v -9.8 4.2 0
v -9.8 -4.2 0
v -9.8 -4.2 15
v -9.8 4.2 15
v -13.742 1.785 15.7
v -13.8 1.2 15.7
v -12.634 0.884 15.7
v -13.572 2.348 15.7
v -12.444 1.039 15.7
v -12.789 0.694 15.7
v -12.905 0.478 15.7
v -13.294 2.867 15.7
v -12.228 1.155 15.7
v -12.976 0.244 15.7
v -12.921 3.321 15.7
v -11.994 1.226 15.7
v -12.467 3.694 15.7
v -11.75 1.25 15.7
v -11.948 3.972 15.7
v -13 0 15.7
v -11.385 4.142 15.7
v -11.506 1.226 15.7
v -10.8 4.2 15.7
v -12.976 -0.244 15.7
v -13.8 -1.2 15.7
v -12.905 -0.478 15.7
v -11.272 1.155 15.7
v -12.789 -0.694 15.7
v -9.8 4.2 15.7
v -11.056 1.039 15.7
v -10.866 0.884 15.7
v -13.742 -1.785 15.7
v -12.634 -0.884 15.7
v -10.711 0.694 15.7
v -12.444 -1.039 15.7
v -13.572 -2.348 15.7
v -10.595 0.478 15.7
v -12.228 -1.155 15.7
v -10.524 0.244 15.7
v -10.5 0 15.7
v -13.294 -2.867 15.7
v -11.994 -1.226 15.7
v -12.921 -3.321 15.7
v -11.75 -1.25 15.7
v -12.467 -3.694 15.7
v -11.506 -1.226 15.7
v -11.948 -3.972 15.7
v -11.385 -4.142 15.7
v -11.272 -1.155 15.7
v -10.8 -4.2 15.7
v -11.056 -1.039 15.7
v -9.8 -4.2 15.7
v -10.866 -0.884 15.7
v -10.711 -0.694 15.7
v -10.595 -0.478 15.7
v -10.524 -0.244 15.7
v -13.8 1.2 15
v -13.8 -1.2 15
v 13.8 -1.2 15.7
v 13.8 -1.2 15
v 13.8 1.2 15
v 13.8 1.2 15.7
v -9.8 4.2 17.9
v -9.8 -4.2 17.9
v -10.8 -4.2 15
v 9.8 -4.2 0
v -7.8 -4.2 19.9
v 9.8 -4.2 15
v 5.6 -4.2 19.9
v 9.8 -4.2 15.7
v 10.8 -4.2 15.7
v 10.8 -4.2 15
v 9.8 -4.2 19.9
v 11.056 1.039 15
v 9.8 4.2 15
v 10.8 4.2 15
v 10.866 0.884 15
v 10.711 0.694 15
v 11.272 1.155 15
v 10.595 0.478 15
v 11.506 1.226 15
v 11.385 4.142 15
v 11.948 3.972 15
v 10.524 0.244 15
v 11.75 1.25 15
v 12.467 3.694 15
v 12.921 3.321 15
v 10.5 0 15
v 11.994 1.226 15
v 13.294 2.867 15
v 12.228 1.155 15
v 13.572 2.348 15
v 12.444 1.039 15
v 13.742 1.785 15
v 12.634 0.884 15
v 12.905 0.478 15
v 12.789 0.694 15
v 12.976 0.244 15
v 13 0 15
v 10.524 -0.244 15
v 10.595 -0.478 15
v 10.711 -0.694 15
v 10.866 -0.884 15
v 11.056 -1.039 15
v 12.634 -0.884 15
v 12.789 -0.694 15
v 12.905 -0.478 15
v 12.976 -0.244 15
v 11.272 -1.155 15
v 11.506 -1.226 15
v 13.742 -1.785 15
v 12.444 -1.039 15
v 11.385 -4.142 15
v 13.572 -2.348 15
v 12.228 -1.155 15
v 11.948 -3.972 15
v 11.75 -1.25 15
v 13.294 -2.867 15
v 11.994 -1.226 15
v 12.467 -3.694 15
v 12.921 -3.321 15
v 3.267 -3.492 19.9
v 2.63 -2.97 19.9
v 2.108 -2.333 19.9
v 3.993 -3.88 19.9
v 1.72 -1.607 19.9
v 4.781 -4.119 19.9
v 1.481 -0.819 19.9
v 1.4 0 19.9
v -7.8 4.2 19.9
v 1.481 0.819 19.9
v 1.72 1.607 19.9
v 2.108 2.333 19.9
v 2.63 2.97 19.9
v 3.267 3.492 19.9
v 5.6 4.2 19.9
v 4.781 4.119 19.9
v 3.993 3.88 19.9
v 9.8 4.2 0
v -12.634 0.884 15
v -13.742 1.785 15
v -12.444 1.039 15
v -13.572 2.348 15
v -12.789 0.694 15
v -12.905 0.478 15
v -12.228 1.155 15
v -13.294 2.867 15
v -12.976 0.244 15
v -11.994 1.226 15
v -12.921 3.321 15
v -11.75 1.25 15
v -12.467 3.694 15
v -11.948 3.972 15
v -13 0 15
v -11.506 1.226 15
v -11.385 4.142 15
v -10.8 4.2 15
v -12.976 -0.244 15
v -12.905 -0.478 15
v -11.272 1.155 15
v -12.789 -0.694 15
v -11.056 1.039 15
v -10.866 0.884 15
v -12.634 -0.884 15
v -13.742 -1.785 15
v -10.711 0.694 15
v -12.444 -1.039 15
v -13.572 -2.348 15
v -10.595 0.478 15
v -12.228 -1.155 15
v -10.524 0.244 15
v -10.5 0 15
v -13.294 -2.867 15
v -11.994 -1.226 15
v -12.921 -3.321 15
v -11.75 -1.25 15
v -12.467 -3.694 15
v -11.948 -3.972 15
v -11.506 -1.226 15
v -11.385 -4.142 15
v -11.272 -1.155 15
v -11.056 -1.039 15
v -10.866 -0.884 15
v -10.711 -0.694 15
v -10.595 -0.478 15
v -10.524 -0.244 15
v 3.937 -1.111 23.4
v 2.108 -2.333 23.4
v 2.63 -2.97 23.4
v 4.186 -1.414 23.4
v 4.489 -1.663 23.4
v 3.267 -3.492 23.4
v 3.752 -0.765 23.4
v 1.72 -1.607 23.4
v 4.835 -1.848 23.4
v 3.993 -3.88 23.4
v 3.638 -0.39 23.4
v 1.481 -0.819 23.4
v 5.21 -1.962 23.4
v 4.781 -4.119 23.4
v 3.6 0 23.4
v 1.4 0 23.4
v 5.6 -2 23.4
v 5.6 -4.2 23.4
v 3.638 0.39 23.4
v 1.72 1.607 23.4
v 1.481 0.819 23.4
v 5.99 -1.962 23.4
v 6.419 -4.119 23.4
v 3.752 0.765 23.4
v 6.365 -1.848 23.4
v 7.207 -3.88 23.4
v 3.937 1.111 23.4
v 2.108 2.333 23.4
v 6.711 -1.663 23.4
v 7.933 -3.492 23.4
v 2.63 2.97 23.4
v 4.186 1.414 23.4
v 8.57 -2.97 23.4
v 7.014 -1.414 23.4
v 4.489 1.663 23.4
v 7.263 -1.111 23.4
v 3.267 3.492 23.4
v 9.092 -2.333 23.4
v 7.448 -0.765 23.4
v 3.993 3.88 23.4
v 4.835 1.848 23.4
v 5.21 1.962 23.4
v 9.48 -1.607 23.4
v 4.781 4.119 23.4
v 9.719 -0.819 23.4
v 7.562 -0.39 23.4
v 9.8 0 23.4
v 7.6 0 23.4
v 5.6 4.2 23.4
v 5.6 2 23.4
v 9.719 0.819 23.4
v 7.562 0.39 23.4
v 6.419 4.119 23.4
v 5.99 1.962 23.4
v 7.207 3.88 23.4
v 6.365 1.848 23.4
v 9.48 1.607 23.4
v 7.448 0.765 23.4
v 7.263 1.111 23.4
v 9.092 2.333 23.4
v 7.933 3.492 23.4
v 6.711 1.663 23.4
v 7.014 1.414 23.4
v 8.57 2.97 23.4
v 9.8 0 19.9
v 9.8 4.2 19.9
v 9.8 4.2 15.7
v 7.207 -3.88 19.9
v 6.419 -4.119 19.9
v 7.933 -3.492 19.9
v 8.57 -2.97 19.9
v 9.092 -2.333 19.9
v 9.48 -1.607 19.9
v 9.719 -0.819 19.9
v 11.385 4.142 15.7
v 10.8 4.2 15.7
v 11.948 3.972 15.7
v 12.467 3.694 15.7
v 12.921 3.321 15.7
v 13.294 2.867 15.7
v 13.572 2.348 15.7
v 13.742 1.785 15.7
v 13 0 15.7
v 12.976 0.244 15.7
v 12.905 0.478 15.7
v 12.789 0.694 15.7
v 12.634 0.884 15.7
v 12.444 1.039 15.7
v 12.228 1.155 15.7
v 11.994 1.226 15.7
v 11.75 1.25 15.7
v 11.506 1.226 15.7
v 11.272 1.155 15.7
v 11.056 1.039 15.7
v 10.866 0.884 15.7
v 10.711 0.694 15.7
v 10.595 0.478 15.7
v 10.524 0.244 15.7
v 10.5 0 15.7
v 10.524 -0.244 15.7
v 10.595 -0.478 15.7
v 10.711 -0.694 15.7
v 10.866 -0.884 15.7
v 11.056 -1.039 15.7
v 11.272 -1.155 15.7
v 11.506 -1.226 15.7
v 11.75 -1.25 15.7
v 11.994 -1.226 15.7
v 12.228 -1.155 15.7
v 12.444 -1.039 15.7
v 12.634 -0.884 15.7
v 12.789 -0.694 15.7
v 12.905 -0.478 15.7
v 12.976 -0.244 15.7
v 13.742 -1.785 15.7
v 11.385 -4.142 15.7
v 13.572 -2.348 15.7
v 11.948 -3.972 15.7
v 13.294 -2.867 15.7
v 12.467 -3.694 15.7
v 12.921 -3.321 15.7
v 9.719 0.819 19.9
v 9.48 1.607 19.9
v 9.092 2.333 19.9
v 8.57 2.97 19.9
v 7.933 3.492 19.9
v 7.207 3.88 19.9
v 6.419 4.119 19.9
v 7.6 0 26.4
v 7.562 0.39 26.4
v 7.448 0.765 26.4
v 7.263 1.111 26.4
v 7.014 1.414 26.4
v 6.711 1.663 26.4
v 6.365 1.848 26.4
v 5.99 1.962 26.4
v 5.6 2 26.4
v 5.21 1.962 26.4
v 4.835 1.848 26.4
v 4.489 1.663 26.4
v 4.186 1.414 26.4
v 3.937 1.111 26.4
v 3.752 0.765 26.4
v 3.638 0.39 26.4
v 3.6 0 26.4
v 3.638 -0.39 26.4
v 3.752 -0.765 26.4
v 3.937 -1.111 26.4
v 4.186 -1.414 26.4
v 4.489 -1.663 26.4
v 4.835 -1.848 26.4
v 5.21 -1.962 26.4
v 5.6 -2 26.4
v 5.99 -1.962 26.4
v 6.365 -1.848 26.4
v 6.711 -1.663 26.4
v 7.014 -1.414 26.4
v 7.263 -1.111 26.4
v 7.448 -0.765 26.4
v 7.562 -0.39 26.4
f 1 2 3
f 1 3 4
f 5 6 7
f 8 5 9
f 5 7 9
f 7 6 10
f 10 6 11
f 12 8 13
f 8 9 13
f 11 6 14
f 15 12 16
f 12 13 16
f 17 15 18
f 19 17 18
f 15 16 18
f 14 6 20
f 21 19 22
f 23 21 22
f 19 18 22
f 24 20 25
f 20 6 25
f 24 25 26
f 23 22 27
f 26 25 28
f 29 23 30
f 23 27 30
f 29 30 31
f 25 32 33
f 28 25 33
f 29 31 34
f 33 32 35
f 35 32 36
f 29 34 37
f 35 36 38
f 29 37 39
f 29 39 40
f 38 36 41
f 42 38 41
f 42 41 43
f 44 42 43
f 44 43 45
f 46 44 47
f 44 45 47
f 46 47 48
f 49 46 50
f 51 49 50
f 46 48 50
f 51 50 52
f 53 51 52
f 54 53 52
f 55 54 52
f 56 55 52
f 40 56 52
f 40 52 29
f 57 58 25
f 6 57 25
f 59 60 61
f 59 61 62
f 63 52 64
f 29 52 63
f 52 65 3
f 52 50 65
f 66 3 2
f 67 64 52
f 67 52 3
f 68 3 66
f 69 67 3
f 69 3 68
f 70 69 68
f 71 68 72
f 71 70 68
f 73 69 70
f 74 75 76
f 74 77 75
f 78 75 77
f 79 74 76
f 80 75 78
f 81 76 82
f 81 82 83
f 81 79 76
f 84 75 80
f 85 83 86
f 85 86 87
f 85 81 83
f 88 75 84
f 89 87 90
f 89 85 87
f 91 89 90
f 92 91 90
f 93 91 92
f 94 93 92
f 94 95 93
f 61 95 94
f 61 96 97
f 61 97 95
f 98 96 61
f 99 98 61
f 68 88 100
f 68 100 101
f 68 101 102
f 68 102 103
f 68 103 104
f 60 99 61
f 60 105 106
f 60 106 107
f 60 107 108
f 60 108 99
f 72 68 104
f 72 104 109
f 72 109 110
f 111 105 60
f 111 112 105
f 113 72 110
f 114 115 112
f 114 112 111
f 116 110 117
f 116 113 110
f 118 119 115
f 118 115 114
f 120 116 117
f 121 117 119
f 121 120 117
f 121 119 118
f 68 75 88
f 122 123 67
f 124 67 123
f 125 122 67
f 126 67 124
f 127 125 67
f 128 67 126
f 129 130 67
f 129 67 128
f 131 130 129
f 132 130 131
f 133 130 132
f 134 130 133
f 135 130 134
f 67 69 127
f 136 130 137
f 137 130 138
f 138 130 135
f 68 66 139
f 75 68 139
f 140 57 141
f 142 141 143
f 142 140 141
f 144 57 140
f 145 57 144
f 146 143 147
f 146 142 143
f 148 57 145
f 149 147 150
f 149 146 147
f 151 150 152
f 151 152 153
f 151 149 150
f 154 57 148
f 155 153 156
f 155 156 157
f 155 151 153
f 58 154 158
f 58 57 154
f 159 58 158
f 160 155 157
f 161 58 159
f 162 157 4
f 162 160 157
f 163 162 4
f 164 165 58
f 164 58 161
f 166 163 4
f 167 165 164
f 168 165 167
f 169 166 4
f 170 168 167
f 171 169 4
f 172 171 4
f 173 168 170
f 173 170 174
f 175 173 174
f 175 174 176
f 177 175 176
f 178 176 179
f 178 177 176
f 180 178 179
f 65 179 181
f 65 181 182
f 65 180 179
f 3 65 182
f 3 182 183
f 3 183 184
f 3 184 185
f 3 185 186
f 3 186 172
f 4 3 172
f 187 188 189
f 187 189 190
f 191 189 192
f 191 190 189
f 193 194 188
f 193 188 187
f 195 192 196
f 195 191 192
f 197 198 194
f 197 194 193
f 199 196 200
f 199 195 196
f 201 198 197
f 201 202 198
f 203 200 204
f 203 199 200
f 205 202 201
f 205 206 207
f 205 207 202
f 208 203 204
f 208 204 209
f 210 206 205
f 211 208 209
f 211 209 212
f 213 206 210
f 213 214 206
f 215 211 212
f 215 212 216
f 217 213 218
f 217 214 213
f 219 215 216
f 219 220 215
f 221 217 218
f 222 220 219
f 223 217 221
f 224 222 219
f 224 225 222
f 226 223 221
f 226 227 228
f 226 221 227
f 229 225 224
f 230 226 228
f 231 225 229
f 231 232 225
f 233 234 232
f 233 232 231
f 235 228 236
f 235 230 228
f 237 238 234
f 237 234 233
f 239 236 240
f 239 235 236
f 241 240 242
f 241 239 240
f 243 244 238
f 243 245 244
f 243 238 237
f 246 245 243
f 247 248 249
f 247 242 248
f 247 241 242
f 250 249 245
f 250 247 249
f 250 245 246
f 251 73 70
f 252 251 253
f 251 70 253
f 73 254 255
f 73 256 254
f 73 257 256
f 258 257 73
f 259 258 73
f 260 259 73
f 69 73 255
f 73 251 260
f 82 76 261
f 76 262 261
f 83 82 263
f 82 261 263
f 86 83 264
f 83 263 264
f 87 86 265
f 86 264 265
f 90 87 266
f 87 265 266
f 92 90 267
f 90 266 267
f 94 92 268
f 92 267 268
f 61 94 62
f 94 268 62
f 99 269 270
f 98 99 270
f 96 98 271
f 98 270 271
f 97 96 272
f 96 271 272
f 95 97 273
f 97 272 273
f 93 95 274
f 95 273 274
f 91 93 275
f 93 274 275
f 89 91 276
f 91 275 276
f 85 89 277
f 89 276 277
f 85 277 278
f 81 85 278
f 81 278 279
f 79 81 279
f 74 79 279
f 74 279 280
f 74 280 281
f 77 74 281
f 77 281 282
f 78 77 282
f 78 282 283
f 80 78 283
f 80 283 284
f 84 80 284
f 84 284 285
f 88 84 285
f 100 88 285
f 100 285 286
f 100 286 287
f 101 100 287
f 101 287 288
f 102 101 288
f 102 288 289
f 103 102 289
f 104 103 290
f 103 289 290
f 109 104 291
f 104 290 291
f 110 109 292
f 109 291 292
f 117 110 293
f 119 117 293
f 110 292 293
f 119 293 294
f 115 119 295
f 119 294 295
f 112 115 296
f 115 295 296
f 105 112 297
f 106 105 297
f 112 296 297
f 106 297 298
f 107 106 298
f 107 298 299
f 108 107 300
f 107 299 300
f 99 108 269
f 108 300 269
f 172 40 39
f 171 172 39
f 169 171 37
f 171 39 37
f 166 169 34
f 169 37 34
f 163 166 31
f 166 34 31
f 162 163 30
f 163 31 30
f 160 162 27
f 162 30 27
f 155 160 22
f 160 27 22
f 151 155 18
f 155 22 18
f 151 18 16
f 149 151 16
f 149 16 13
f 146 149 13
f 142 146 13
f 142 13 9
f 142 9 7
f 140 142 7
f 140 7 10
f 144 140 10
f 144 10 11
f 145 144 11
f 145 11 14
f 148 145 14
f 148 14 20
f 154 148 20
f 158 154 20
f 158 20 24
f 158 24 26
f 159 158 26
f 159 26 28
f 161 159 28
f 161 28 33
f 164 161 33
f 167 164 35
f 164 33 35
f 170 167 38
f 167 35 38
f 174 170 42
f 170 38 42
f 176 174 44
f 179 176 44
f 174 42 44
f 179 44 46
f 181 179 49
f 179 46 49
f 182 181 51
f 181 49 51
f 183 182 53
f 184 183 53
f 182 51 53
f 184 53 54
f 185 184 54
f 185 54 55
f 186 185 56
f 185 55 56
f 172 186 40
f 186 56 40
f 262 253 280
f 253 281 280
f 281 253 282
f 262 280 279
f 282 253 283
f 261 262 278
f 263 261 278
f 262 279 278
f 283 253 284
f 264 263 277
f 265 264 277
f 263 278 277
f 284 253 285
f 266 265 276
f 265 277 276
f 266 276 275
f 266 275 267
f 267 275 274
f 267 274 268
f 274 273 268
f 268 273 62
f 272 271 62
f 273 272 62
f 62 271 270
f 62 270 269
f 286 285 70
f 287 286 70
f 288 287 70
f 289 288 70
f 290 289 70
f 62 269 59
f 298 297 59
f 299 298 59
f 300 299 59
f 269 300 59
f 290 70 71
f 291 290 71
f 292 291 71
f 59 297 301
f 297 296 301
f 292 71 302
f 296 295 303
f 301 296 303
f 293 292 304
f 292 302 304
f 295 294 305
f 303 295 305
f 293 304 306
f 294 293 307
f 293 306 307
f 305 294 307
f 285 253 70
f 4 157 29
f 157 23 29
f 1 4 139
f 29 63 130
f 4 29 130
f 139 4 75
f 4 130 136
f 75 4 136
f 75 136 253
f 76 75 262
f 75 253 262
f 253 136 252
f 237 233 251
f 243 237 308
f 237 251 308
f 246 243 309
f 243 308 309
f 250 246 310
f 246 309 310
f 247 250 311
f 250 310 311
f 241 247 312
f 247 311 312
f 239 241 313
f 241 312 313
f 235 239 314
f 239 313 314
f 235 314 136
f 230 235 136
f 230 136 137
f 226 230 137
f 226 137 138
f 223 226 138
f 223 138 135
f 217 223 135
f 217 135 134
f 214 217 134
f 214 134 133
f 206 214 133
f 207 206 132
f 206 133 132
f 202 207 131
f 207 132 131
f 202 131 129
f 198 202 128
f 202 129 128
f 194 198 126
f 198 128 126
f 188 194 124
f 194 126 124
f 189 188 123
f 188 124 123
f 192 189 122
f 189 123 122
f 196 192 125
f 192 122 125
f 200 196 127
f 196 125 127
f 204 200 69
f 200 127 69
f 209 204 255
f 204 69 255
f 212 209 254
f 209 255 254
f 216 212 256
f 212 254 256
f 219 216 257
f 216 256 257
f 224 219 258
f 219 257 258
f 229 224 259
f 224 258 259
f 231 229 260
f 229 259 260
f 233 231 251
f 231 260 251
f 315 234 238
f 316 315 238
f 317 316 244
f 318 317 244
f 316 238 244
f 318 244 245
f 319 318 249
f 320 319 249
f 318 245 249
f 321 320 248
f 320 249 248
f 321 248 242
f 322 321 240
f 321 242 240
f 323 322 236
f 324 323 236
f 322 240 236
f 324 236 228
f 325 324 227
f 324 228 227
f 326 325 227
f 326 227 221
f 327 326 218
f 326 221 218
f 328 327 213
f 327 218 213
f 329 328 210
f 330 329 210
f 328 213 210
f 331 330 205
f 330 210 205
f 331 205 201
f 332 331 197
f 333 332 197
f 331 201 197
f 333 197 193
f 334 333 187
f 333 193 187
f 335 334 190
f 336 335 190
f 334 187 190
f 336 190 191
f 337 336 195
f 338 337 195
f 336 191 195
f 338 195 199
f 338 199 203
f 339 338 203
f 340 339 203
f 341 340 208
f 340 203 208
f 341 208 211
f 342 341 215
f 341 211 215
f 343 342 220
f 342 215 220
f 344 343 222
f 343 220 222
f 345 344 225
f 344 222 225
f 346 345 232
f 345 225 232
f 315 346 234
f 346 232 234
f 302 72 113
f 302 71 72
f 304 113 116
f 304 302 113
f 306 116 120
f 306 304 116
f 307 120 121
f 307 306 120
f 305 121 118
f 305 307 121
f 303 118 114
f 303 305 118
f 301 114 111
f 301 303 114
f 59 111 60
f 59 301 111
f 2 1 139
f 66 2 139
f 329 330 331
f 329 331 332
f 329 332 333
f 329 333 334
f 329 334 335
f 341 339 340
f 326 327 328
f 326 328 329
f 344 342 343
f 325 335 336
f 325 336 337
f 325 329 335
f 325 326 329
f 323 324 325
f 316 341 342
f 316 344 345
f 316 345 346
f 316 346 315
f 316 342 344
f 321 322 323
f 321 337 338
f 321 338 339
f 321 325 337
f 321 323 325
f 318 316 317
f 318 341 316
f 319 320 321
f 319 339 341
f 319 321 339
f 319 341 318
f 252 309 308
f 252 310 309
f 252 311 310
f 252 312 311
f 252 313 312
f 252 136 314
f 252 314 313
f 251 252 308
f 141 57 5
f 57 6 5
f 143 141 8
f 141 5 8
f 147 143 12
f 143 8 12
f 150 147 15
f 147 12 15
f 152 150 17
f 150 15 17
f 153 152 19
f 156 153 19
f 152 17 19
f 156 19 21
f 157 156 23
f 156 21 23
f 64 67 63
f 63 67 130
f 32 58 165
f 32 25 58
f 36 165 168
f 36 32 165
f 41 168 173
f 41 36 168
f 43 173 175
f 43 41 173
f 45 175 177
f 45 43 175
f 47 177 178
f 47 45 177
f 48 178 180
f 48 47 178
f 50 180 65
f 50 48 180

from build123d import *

# Parameters (mm, degrees)
SKETCH_1_W          = 19.6
SKETCH_1_H          = 8.4
EXTRUDE_1_DEPTH     = 19.9
CHAMFER_1_SIZE      = 2
SKETCH_2_W          = 27.6
SKETCH_2_H          = 0.7
EXTRUDE_2_DEPTH     = 8.4
FILLET_1_R          = 3
CUT_EXTRUDE_1_REACH = 23.321
SKETCH_3_R          = 1.25
SKETCH_4_R          = 4.2
EXTRUDE_3_DEPTH     = 3.5
SKETCH_5_R          = 2
EXTRUDE_4_DEPTH     = 3


with BuildPart() as part:
    # 草圖1 → 填料-伸長1 (new body)
    with BuildSketch(Plane.XY):
        Rectangle(SKETCH_1_W, SKETCH_1_H)
    extrude(amount=EXTRUDE_1_DEPTH)

    # 導角1
    chamfer_1_edges = [part.edges().sort_by_distance(p)[0] for p in [
        (-9.8, 0, 19.9),
    ]]
    chamfer(chamfer_1_edges, length=CHAMFER_1_SIZE)

    # 草圖2 → 填料-伸長2 (add)
    with BuildSketch(Plane.XZ.offset(4.2)):
        with Locations((0, 15.35)):
            Rectangle(SKETCH_2_W, SKETCH_2_H)
    extrude(amount=-EXTRUDE_2_DEPTH)

    # 圓角1
    fillet_1_edges = [part.edges().sort_by_distance(p)[0] for p in [
        (13.8, -4.2, 15.35),
        (-13.8, -4.2, 15.35),
        (13.8, 4.2, 15.35),
        (-13.8, 4.2, 15.35),
    ]]
    fillet(fillet_1_edges, radius=FILLET_1_R)

    # 草圖3 → 除料-伸長1 (cut, up to next)
    with BuildSketch(Plane.XY.offset(15.7), mode=Mode.PRIVATE) as cut_extrude_1_sk1:
        with Locations((-11.75, 0)):
            Circle(SKETCH_3_R)
    cut_extrude_1_tool1 = extrude(cut_extrude_1_sk1.sketch, amount=-CUT_EXTRUDE_1_REACH, mode=Mode.PRIVATE) & part.part
    # 草圖3 → 除料-伸長1 (cut, up to next)
    with BuildSketch(Plane.XY.offset(15.7), mode=Mode.PRIVATE) as cut_extrude_1_sk2:
        with Locations((11.75, 0)):
            Circle(SKETCH_3_R)
    cut_extrude_1_tool2 = extrude(cut_extrude_1_sk2.sketch, amount=-CUT_EXTRUDE_1_REACH, mode=Mode.PRIVATE) & part.part
    add(cut_extrude_1_tool1.solids().sort_by_distance((-11.75, 0, 15.7))[0], mode=Mode.SUBTRACT)
    add(cut_extrude_1_tool2.solids().sort_by_distance((11.75, 0, 15.7))[0], mode=Mode.SUBTRACT)

    # 草圖4 → 填料-伸長3 (add)
    with BuildSketch(Plane.XY.offset(19.9)):
        with Locations((5.6, 0)):
            Circle(SKETCH_4_R)
    extrude(amount=EXTRUDE_3_DEPTH)

    # 草圖5 → 填料-伸長4 (add)
    with BuildSketch(Plane.XY.offset(23.4)):
        with Locations((5.6, 0)):
            Circle(SKETCH_5_R)
    extrude(amount=EXTRUDE_4_DEPTH)


solid = part.part
